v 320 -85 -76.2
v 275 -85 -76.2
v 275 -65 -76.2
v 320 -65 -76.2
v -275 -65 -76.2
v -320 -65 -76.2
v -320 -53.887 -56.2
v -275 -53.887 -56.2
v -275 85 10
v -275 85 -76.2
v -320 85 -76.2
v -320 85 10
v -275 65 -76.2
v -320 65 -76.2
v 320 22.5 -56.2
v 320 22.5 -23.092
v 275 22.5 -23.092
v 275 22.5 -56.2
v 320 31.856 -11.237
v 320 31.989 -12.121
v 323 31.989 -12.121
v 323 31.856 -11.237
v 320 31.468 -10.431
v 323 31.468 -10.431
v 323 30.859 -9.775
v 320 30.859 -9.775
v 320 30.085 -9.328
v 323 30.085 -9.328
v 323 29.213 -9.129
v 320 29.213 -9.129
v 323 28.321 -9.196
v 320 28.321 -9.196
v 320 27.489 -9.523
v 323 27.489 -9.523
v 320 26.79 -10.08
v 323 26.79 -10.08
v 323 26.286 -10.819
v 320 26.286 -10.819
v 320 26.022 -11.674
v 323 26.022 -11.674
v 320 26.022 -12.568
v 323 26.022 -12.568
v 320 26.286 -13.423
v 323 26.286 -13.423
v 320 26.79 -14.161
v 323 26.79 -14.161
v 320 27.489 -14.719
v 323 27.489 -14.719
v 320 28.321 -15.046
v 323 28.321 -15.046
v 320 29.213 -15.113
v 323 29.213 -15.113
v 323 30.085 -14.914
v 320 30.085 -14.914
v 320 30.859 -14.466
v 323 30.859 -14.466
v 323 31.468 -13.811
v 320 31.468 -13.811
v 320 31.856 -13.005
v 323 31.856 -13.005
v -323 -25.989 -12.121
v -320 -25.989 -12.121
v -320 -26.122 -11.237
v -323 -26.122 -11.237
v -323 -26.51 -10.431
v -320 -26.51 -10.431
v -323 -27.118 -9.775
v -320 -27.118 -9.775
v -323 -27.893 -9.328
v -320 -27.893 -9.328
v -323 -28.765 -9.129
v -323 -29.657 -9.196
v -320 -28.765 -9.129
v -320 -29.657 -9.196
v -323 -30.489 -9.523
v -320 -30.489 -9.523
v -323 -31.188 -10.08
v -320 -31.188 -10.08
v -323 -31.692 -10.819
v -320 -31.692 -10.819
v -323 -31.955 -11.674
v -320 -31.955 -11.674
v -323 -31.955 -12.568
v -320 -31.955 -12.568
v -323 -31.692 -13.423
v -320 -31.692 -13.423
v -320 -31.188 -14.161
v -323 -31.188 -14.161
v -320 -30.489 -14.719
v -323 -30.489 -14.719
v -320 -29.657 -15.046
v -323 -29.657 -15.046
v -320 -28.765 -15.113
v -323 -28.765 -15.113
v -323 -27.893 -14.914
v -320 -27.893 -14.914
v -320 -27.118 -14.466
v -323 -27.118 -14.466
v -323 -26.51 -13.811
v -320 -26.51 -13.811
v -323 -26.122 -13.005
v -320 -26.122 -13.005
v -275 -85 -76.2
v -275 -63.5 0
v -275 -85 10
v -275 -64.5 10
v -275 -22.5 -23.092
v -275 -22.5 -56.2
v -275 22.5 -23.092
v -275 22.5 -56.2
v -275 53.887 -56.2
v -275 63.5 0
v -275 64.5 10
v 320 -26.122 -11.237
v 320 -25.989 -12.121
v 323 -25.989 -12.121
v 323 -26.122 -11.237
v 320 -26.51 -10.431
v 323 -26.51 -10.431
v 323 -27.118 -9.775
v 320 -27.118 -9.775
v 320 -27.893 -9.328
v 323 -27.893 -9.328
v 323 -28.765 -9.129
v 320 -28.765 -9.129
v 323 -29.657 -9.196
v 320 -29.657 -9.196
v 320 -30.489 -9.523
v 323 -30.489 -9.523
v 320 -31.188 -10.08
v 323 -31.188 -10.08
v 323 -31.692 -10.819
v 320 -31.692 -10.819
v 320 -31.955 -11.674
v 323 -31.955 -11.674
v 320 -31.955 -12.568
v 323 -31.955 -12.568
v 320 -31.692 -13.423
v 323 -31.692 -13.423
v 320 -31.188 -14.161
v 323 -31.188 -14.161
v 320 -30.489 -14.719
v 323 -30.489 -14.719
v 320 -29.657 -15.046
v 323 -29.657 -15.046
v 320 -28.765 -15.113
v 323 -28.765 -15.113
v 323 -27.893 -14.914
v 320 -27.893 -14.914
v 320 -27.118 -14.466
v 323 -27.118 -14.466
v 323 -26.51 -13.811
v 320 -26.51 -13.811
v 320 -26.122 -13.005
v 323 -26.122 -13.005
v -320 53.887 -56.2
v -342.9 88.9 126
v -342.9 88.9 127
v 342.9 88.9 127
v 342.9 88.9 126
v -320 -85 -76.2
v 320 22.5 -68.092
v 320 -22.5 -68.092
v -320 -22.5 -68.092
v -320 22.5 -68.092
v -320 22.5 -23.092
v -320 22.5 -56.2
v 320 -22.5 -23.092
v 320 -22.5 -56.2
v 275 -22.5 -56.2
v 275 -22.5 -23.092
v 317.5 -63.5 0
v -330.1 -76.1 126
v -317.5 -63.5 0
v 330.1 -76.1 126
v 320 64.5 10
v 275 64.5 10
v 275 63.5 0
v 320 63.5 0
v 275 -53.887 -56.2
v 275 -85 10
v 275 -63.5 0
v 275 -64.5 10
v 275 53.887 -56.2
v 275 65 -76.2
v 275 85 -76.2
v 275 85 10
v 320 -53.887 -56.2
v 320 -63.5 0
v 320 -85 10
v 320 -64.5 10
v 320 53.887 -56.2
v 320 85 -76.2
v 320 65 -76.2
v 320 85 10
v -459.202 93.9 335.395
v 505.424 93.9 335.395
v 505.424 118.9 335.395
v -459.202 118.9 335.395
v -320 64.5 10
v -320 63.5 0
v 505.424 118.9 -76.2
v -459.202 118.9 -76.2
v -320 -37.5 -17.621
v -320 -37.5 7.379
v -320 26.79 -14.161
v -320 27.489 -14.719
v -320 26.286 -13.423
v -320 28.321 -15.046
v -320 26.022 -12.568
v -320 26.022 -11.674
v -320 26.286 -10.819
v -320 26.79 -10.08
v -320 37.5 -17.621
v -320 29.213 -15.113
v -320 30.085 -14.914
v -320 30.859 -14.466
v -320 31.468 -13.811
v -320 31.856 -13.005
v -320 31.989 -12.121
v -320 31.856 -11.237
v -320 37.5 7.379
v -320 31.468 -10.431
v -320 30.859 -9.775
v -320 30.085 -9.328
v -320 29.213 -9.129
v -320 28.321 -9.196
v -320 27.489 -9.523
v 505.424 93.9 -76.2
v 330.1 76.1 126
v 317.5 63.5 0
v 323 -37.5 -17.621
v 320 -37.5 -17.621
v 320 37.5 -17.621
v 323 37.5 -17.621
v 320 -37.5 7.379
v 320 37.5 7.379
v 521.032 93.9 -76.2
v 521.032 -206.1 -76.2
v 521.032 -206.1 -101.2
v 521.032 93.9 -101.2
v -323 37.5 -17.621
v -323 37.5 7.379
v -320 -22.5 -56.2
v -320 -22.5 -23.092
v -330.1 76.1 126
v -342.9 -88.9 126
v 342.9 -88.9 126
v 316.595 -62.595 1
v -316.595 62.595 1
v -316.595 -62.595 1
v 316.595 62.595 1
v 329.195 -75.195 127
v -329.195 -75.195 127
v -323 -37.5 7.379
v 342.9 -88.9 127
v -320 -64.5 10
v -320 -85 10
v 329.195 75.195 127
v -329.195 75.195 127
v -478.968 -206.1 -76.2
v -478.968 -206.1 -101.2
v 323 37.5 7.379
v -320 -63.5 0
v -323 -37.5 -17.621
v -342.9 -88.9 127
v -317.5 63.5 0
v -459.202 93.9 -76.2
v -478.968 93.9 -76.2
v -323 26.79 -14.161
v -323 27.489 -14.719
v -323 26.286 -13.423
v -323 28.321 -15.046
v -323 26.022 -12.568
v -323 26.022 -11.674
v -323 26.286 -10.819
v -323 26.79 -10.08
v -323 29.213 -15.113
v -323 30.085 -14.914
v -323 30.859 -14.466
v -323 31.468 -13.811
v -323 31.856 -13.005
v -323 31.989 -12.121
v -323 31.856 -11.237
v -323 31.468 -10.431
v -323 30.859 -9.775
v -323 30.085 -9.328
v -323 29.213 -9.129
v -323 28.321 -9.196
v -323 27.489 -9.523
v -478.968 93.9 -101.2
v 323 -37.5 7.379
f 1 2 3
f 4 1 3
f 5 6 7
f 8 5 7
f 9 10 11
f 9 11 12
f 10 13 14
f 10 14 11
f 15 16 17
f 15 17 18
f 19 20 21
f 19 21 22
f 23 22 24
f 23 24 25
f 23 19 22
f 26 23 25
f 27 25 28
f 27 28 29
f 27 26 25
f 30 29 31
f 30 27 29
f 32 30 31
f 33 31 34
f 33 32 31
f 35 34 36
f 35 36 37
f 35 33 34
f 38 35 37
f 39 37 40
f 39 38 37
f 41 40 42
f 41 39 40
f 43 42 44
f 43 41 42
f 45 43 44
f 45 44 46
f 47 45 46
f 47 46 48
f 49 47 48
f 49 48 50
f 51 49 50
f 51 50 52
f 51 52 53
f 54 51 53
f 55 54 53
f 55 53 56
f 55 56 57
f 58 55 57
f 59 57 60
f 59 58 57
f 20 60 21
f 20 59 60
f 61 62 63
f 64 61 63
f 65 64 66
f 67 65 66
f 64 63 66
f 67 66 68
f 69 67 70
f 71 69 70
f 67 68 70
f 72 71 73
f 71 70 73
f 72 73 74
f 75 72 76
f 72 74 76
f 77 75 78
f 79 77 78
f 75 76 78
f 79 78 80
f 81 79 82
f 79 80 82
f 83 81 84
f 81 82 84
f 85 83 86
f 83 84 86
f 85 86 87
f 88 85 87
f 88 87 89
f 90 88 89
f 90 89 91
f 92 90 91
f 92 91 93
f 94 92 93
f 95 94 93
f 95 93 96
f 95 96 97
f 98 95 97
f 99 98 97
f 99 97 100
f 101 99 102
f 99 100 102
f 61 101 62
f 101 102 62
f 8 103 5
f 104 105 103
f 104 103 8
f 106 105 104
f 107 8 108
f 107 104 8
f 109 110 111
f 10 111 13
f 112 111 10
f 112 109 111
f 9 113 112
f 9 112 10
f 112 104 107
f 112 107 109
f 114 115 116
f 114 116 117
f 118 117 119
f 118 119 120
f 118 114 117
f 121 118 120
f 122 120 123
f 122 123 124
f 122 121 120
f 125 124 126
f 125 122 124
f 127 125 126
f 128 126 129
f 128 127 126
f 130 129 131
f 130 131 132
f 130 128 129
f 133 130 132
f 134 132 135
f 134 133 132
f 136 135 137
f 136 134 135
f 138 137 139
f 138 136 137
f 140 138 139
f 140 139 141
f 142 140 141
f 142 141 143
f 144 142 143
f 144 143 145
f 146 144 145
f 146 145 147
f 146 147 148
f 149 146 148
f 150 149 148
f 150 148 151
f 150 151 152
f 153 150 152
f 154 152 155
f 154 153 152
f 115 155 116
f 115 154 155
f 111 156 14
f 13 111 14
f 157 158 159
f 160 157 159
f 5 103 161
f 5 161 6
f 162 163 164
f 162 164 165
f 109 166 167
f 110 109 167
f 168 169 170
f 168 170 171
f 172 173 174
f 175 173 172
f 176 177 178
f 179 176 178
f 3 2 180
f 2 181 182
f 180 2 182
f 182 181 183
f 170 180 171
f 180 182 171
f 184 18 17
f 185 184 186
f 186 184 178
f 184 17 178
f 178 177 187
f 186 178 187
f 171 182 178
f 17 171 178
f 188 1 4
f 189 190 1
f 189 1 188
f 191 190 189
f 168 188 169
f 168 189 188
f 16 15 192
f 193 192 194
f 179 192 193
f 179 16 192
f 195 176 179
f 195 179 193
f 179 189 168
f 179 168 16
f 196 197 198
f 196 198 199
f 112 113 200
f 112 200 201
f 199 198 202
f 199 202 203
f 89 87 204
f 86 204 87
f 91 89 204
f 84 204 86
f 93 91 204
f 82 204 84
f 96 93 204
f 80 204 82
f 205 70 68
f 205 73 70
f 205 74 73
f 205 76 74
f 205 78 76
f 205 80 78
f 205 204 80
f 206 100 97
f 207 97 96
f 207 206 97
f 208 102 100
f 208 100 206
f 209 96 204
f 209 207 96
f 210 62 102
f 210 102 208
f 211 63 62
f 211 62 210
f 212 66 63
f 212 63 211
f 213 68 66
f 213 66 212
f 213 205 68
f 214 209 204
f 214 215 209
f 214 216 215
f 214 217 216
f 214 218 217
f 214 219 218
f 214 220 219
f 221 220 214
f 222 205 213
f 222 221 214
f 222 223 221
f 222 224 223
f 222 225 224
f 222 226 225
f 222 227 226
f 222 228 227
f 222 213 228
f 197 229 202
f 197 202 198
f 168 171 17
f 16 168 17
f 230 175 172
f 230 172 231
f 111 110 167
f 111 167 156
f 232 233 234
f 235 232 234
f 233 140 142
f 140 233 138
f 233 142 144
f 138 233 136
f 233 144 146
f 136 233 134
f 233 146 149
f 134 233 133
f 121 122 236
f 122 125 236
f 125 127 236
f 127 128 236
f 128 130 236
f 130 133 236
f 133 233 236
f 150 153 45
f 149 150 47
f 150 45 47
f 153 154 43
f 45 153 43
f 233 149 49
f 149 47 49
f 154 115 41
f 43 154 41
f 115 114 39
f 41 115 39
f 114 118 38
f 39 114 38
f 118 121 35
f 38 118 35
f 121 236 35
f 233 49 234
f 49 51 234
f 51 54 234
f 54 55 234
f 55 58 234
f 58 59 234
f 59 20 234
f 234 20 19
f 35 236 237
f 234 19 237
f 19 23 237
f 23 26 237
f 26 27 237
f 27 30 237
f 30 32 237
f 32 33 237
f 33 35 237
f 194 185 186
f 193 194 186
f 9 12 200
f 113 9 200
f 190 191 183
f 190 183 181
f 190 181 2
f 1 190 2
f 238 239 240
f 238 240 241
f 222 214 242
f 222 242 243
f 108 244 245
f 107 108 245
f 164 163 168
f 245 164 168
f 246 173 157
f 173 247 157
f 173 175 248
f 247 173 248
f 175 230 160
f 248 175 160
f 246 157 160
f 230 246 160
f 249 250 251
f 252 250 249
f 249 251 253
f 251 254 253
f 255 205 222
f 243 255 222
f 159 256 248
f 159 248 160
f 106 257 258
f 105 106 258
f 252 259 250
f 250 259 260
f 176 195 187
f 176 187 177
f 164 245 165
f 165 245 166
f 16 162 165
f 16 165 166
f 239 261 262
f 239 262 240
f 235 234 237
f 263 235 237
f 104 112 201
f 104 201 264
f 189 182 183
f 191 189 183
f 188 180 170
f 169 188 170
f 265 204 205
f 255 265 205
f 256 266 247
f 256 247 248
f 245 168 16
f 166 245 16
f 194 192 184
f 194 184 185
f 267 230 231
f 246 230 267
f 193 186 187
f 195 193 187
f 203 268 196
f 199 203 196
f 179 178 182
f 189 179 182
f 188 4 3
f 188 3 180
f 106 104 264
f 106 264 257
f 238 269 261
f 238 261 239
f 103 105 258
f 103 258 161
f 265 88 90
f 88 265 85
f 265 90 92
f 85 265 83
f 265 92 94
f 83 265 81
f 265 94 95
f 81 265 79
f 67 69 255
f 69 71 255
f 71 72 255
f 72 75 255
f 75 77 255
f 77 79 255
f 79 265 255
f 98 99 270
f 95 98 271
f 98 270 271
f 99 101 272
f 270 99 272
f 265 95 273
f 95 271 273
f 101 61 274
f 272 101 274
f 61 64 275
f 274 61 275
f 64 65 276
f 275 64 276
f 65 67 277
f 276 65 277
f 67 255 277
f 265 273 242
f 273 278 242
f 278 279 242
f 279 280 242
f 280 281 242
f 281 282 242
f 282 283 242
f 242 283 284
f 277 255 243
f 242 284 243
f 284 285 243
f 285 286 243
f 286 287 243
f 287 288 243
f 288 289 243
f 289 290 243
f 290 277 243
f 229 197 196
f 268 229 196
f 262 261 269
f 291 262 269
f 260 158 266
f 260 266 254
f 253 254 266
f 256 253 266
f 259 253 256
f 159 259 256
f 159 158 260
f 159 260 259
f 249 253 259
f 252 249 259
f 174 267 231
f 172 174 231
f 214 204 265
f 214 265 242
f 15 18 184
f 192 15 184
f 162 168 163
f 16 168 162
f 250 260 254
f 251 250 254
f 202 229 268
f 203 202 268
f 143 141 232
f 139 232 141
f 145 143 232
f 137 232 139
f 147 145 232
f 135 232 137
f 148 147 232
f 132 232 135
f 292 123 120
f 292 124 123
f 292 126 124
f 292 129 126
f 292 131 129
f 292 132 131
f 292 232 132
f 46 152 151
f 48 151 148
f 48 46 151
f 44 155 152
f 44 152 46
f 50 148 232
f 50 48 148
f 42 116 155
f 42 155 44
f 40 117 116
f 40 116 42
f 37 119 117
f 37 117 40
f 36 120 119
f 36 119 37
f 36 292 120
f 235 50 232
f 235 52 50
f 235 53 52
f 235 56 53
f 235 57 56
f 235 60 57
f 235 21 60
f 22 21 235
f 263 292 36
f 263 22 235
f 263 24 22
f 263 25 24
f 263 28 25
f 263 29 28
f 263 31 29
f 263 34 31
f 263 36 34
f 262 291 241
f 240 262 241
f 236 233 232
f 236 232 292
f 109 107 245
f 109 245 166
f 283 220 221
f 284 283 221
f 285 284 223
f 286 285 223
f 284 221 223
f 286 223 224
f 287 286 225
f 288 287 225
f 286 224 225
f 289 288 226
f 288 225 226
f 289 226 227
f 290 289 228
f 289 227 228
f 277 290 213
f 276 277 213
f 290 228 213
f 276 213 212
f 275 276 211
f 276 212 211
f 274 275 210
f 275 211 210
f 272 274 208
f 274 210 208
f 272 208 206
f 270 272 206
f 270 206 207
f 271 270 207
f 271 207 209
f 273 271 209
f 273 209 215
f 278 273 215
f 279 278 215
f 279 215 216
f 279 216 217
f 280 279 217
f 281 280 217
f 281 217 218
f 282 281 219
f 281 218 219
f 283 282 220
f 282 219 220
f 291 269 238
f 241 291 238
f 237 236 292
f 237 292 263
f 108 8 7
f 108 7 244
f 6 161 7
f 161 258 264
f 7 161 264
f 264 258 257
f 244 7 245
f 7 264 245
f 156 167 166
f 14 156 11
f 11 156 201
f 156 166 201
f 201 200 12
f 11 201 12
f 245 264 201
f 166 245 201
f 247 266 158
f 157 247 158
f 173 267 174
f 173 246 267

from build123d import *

# Parameters (mm, degrees)
F0_W      = 635
F0_H      = 127
F2_W      = 660.4
F2_H      = 152.4
F4_T      = -1
F5_W      = 685.8
F5_H      = 177.8
F5_W_2    = 658.3900248758
F5_H_2    = 150.3900248758
F6_DEPTH  = 1
F8_W      = 1000
F8_H      = 300
F9_DEPTH  = 25
F10_W     = 964.6258950233
F10_H     = 411.5948891163
F11_DEPTH = 25
F14_DEPTH = 45
F15_W     = 75
F15_H     = 25
F15_R     = 3
F16_DEPTH = 3
F18_W     = 45
F18_H     = 45
F19_DEPTH = 640


with BuildPart() as f3:
    # F0 (on Top) → F3 section 0
    with BuildSketch(Plane.XY):
        Rectangle(F0_W, F0_H)
    # F2 (on offset) → F3 section 1
    with BuildSketch(Plane.XY.offset(127)):
        Rectangle(F2_W, F2_H)
    loft()

    # F4
    f4_openings = [f3.faces().sort_by_distance(p)[0] for p in [
        (0, 0, 127),
    ]]
    offset(amount=F4_T, openings=f4_openings, kind=Kind.INTERSECTION)

    # F5 (on offset) → F6 (join)
    with BuildSketch(Plane.XY.offset(127)):
        Rectangle(F5_W, F5_H)
        Rectangle(F5_W_2, F5_H_2, mode=Mode.SUBTRACT)
    extrude(amount=-F6_DEPTH)


with BuildPart() as f9:
    # F8 (on offset) → F9 (new body)
    with BuildSketch(Plane.XY.offset(-76.2)):
        with Locations((21.0319106322, -56.1)):
            Rectangle(F8_W, F8_H)
    extrude(amount=-F9_DEPTH)


with BuildPart() as f11:
    # F10 (on face) → F11 (new body)
    with BuildSketch(Plane(origin=(0, 93.9, 0), x_dir=(-1, 0, 0), z_dir=(0, 1, 0))):
        with Locations((-23.1108367443, 129.5974445581)):
            Rectangle(F10_W, F10_H)
    extrude(amount=F11_DEPTH)


with BuildPart() as f14:
    # F13 (on offset) → F14 (new body)
    with BuildSketch(Plane.YZ.offset(275)):
        Polygon((-64.5, 10), (-85, 10), (-85, -76.2), (-65, -76.2), (-53.887236689, -56.2), (-22.5, -56.2), (-22.5, -23.0920892209), (22.5, -23.0920892209), (22.5, -56.2), (53.887236689, -56.2), (65, -76.2), (85, -76.2), (85, 10), (64.5, 10), (63.5, 0), (-63.5, 0), align=None)
    extrude(amount=F14_DEPTH)


with BuildPart() as f16:
    # F15 (on face) → F16 (new body)
    with BuildSketch(Plane.YZ.offset(320)):
        with Locations((0, -5.1209209487)):
            Rectangle(F15_W, F15_H)
        with Locations((-28.9889592677, -12.1209209487)):
            Circle(F15_R, mode=Mode.SUBTRACT)
        with Locations((28.9889592677, -12.1209209487)):
            Circle(F15_R, mode=Mode.SUBTRACT)
    extrude(amount=F16_DEPTH)


with BuildPart() as f17_1:
    # F17: instance of F14
    add(f14.part.mirror(Plane.YZ))


with BuildPart() as f17_2:
    # F17: instance of F16
    add(f16.part.mirror(Plane.YZ))


with BuildPart() as f19:
    # F18 (on face) → F19 (new body, through all)
    with BuildSketch(Plane.YZ.offset(320)):
        with Locations((0, -45.5920892209)):
            Rectangle(F18_W, F18_H)
    extrude(amount=-F19_DEPTH)


solid = Compound([f3.part, f9.part, f11.part, f14.part, f16.part, f17_1.part, f17_2.part, f19.part])
